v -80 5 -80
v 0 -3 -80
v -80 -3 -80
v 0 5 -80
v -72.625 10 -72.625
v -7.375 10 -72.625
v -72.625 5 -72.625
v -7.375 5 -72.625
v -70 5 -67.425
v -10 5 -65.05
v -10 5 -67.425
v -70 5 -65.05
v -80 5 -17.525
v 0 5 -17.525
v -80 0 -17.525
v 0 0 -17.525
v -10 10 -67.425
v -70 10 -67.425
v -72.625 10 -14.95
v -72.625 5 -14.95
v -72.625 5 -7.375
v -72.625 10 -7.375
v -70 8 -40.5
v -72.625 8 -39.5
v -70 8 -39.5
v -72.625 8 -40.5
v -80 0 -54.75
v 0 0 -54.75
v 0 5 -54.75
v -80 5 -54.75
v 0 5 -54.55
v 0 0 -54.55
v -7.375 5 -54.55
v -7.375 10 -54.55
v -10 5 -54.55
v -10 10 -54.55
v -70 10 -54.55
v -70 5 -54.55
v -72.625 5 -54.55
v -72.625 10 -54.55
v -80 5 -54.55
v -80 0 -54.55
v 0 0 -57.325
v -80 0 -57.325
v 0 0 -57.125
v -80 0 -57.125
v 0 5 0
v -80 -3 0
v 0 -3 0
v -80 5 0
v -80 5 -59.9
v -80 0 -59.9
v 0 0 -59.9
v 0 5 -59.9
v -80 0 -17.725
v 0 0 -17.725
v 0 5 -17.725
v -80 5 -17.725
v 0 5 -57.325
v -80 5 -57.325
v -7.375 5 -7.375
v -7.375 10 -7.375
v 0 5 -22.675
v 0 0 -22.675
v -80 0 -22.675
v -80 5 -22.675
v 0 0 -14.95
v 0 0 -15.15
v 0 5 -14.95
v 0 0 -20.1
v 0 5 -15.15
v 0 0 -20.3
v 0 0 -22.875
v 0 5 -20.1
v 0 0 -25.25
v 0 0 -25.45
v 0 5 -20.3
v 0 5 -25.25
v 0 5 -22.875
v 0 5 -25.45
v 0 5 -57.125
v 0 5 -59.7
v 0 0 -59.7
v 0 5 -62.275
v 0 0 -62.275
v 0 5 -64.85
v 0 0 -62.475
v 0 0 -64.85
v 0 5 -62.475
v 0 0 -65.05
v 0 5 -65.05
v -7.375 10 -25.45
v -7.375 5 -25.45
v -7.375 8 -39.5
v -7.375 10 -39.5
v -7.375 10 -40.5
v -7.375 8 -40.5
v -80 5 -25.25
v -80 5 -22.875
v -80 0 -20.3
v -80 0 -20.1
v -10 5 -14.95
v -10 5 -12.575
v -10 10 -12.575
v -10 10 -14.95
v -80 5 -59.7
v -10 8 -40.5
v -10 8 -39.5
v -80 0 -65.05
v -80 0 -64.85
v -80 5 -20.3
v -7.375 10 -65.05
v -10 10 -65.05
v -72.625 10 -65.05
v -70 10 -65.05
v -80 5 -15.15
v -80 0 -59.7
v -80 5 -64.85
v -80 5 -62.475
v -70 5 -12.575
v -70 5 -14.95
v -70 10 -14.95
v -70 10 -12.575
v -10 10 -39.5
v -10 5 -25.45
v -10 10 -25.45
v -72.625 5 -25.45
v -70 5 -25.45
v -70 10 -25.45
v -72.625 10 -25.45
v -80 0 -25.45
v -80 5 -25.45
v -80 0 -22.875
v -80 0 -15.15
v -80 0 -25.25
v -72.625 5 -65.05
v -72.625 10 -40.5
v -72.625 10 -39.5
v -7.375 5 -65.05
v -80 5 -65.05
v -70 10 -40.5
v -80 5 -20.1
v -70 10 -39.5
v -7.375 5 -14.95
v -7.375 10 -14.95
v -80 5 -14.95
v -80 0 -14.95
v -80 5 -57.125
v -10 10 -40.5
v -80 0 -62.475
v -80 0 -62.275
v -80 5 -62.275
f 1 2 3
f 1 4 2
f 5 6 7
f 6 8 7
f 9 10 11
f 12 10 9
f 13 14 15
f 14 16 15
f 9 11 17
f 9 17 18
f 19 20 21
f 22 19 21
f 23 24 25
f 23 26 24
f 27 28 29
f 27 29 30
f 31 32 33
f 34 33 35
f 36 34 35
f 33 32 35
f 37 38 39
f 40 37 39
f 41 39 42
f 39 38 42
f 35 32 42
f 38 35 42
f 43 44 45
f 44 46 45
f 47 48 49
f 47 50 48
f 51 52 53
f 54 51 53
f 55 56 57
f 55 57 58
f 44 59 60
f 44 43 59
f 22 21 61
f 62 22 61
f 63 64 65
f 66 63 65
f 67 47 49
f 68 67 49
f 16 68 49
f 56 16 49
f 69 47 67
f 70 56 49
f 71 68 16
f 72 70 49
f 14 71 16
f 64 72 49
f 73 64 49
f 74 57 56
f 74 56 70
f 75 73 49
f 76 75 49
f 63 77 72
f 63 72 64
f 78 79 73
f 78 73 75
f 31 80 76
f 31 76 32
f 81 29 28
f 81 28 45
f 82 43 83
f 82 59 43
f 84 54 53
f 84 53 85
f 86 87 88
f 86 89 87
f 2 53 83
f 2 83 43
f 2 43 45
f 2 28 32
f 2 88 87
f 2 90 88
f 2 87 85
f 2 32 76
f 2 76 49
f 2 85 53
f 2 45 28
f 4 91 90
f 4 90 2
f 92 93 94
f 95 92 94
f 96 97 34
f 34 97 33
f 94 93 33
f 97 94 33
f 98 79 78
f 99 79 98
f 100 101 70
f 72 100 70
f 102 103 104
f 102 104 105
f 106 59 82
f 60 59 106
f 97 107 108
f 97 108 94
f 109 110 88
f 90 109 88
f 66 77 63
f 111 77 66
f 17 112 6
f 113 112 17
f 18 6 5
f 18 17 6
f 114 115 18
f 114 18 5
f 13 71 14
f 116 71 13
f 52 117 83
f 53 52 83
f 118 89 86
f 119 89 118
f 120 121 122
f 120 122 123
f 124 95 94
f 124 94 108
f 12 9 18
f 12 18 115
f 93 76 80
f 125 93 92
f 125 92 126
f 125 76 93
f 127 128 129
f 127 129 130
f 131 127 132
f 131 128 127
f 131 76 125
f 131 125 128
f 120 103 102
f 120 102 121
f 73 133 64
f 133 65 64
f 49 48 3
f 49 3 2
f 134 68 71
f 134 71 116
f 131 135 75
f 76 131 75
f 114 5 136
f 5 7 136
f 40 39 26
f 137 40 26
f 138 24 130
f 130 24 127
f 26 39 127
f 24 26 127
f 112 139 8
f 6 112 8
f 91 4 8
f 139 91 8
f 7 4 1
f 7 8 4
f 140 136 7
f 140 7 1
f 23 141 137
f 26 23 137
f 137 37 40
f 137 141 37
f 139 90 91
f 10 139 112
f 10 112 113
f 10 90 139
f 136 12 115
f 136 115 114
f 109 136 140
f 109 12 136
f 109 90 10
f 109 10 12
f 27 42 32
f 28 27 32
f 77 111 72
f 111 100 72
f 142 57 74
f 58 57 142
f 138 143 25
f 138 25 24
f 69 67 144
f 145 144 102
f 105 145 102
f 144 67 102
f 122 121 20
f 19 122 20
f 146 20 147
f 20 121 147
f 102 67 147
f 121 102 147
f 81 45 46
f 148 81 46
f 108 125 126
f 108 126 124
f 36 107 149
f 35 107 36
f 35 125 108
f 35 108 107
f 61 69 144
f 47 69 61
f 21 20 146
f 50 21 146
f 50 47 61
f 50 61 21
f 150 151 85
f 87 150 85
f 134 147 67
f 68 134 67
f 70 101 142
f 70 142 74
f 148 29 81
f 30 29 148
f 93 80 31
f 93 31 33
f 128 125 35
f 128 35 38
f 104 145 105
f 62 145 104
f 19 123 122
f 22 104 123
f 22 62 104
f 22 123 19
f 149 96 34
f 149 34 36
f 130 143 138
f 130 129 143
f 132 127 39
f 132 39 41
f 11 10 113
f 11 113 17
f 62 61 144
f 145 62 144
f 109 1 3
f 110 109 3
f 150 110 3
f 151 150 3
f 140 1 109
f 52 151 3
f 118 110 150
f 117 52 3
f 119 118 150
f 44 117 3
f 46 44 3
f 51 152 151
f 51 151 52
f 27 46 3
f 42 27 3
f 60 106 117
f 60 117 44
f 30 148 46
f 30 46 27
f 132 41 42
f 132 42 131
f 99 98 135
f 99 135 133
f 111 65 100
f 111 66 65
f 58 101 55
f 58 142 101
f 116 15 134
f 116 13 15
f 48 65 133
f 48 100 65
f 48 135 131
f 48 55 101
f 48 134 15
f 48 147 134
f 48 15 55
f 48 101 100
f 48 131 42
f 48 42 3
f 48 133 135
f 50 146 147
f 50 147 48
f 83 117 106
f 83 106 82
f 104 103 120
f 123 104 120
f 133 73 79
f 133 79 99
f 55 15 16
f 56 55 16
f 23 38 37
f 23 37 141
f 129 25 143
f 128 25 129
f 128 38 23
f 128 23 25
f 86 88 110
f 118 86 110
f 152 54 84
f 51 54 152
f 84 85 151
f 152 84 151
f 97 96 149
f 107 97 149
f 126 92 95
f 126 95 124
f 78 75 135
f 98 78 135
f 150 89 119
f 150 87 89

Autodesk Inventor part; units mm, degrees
ref_plane "YZ Plane" through (0, 0, 0) normal (1, 0, 0) x (0, 1, 0)
ref_plane "XZ Plane" through (0, 0, 0) normal (0, 1, 0) x (-1, 0, 0)
ref_plane "XY Plane" through (0, 0, 0) normal (0, 0, 1) x (1, 0, 0)
sketch "Boceto1" plane through (0, 0, 0) normal (0, 1, 0) x (-1, 0, 0)
  line L0 (0, 0) -> (80, 0)
  line L1 (80, 0) -> (80, -80)
  line L2 (80, -80) -> (0, -80)
  line L3 (0, -80) -> (0, 0)
  line L4 (10, -70) -> (70, -70)
  line L5 (70, -70) -> (70, -10)
  line L6 (70, -10) -> (10, -10)
  line L7 (10, -10) -> (10, -70)
  line L8 (0, -12.375) -> (80, -12.375)
  line L9 (0, -14.95) -> (80, -14.95)
  line L10 (0, -17.525) -> (80, -17.525)
  line L11 (80, -20.1) -> (0, -20.1)
  line L12 (0, -22.675) -> (80, -22.675)
  line L13 (0, -12.575) -> (80, -12.575)
  line L14 (0, -15.15) -> (80, -15.15)
  line L15 (0, -17.725) -> (80, -17.725)
  line L16 (80, -20.3) -> (0, -20.3)
  line L17 (0, -22.875) -> (80, -22.875)
  line L18 (0, -25.25) -> (80, -25.25)
  line L19 (0, -25.45) -> (80, -25.45)
  line L20 (10, -40) -> (80, -40)
  line L21 (0, -67.625) -> (80, -67.625)
  line L22 (0, -65.05) -> (80, -65.05)
  line L23 (0, -62.475) -> (80, -62.475)
  line L24 (80, -59.9) -> (0, -59.9)
  line L25 (0, -57.325) -> (80, -57.325)
  line L26 (0, -67.425) -> (80, -67.425)
  line L27 (0, -64.85) -> (80, -64.85)
  line L28 (0, -62.275) -> (80, -62.275)
  line L29 (80, -59.7) -> (0, -59.7)
  line L30 (0, -57.125) -> (80, -57.125)
  line L31 (0, -54.75) -> (80, -54.75)
  line L32 (0, -54.55) -> (80, -54.55)
  line L33 (72.625, -7.375) -> (7.375, -7.375)
  line L34 (7.375, -7.375) -> (7.375, -72.625)
  line L35 (7.375, -72.625) -> (72.625, -72.625)
  line L36 (72.625, -72.625) -> (72.625, -7.375)
  line L37 (7.375, 0) -> (0, 0)
  line L38 (7.375, -80) -> (0, -80)
  point P0 (10, -12.375)
  point P1 (70, -12.375)
  point P2 (10, -14.95)
  point P3 (70, -14.95)
  point P4 (10, -17.525)
  point P5 (70, -17.525)
  point P6 (70, -20.1)
  point P7 (10, -20.1)
  point P8 (10, -22.675)
  point P9 (70, -22.675)
  point P10 (10, -12.575)
  point P11 (70, -12.575)
  point P12 (10, -15.15)
  point P13 (70, -15.15)
  point P14 (10, -17.725)
  point P15 (70, -17.725)
  point P16 (70, -20.3)
  point P17 (10, -20.3)
  point P18 (10, -22.875)
  point P19 (70, -22.875)
  point P20 (10, -25.25)
  point P21 (70, -25.25)
  point P22 (10, -25.45)
  point P23 (70, -25.45)
  point P24 (10, -67.625)
  point P25 (70, -67.625)
  point P26 (10, -65.05)
  point P27 (70, -65.05)
  point P28 (10, -62.475)
  point P29 (70, -62.475)
  point P30 (70, -59.9)
  point P31 (10, -59.9)
  point P32 (10, -57.325)
  point P33 (70, -57.325)
  point P34 (10, -67.425)
  point P35 (70, -67.425)
  point P36 (10, -64.85)
  point P37 (70, -64.85)
  point P38 (10, -62.275)
  point P39 (70, -62.275)
  point P40 (70, -59.7)
  point P41 (10, -59.7)
  point P42 (10, -57.125)
  point P43 (70, -57.125)
  point P44 (10, -54.75)
  point P45 (70, -54.75)
  point P46 (10, -54.55)
  point P47 (70, -54.55)
  point P48 (72.625, -12.375)
  point P49 (7.375, -12.375)
  point P50 (72.625, -54.55)
  point P51 (72.625, -25.45)
  point P52 (70, -25.45)
  point P53 (70, -54.55)
  point P54 (7.375, -25.45)
  point P55 (7.375, -54.55)
  point P56 (10, -54.55)
  point P57 (10, -25.45)
  point P58 (10, -67.625)
  point P59 (7.375, -67.625)
  point P60 (72.625, -67.625)
  point P61 (70, -67.625)
  point P62 (7.375, -14.95)
  point P63 (72.625, -14.95)
  point P64 (72.625, -65.05)
  point P65 (70, -65.05)
  point P66 (10, -65.05)
  point P67 (7.375, -65.05)
  point P68 (70, -67.425)
  point P69 (10, -67.425)
  point P70 (10, -12.575)
  point P71 (70, -12.575)
  dimension "d0" = 80
  dimension "d1" = 80
  dimension "d2" = 60
  dimension "d3" = 60
  dimension "d4" = 10
  dimension "d5" = 10
  dimension "d6" = 2.375
  dimension "d7" = 0.2
  dimension "d8" = 2.375
  dimension "d9" = 0.2
  dimension "d10" = 0.2
  dimension "d11" = 0.2
  dimension "d12" = 0.2
  dimension "d13" = 2.375
  dimension "d14" = 2.375
  dimension "d15" = 2.375
  dimension "d16" = 2.375
  dimension "d17" = 0.2
  dimension "d35" = 5
extrude "Extrusión1" add sketch "Boceto1" along normal blind 5 contours L0 L1 L8 L36 L33 L34 L3 | L8 L34 L13 L3 | L13 L34 L9 L3 | L34 L33 L36 L8 L5 L6 L7 | L8 L7 L13 L34 | L1 L13 L36 L8 | L13 L7 L9 L34 | L8 L5 L13 L7 | L7 L6 L5 L8 | L1 L9 L36 L13 | L36 L13 L5 L8 | L14 L34 L10 L3 | L13 L5 L9 L7 | L36 L9 L5 L13 | L14 L7 L10 L34 | L1 L10 L36 L14 | L15 L34 L11 L3 | L14 L5 L10 L7 | L36 L10 L5 L14 | L15 L7 L11 L34 | L1 L11 L36 L15 | L16 L34 L12 L3 | L15 L5 L11 L7 | L36 L11 L5 L15 | L16 L7 L12 L34 | L1 L12 L36 L16 | L17 L34 L18 L3 | L16 L5 L12 L7 | L36 L12 L5 L16 | L17 L7 L18 L34 | L1 L18 L36 L17 | L19 L34 L32 L3 | L17 L5 L18 L7 | L36 L18 L5 L17 | L19 L7 L32 L34 | L1 L20 L36 L19 | L31 L34 L30 L3 | L19 L5 L20 L7 | L1 L32 L36 L20 | L36 L20 L5 L19 | L31 L7 L30 L34 | L7 L20 L5 L32 | L36 L32 L5 L20 | L25 L34 L29 L3 | L31 L5 L30 L7 | L1 L30 L36 L31 | L25 L7 L29 L34 | L31 L36 L30 L5 | L24 L34 L28 L3 | L25 L5 L29 L7 | L1 L29 L36 L25 | L24 L7 L28 L34 | L25 L36 L29 L5 | L23 L34 L27 L3 | L24 L5 L28 L7 | L1 L28 L36 L24 | L23 L7 L27 L34 | L24 L36 L28 L5 | L22 L34 L26 L3 | L23 L5 L27 L7 | L1 L27 L36 L23 | L26 L34 L21 L3 | L22 L7 L26 L34 | L23 L36 L27 L5 | L21 L34 L35 L36 L1 L2 L3 | L26 L7 L21 L34 | L22 L5 L26 L7 | L1 L26 L36 L22 | L21 L7 L4 L5 L36 L35 L34 | L26 L5 L21 L7 | L22 L36 L26 L5 | L1 L21 L36 L26 | L21 L5 L4 L7 | L26 L36 L21 L5
sketch "Boceto2" plane through (0, 0, 0) normal (0, -1, 0) x (1, 0, 0)
  line L0 (0, -80) -> (-80, -80) projected
  line L1 (-80, 0) -> (0, 0) projected
  line L2 (-80, -80) -> (-80, 0)
  line L3 (-80, 0) -> (0, 0)
  line L4 (-80, -65.05) -> (0, -65.05) construction
  line L5 (0, 0) -> (0, -80)
  line L6 (-80, -80) -> (0, -80)
extrude "Extrusión4" add sketch "Boceto2" along normal blind 3
extrude "Extrusión5" add sketch "Boceto1" along normal blind 10 contours L34 L33 L36 L8 L5 L6 L7 | L8 L7 L13 L34 | L13 L7 L9 L34 | L8 L5 L13 L7 | L7 L6 L5 L8 | L36 L13 L5 L8 | L36 L9 L5 L13 | L19 L7 L32 L34 | L36 L20 L5 L19 | L36 L32 L5 L20 | L22 L7 L26 L34 | L26 L7 L21 L34 | L21 L7 L4 L5 L36 L35 L34 | L26 L5 L21 L7 | L22 L36 L26 L5 | L21 L5 L4 L7 | L26 L36 L21 L5
sketch "Boceto3" plane through (0, 10, 0) normal (0, 1, 0) x (1, 0, 0)
  line L0 (-7.375, 25.45) -> (-7.375, 54.55) projected
  line L1 (-7.375, 40) -> (-86.5517, 40)
  line L2 (-5, 39.5) -> (-84.1767, 39.5)
  line L3 (-5, 40.5) -> (-84.1767, 40.5)
  line L4 (-10, 54.55) -> (-10, 25.45) projected
  line L5 (-5, 40.5) -> (-5, 39.5)
  line L6 (-84.1767, 40.5) -> (-84.1767, 39.5)
  point P0 (0, 0)
  point P1 (-10, 40)
  point P2 (-10, 39.5)
  point P3 (-10, 40.5)
  point P4 (-7.375, 39.5)
  point P5 (-7.375, 40.5)
  dimension "d31" = 0.5
  dimension "d32" = 0.5
extrude "Extrusión6" cut sketch "Boceto3" against normal blind 2 contours L2 L4 L1 L0 | L1 L4 L3 L0 | L2 L6 L1 L4 | L1 L6 L3 L4
equation "\"d8\" = d6"
equation "\"d9\" = d7"
equation "\"d10\" = d9"
equation "\"d11\" = d7"
equation "\"d12\" = d7"
equation "\"d13\" = d6"
equation "\"d14\" = d6"
equation "\"d15\" = d6"
equation "\"d16\" = d6"
equation "\"d17\" = d7"
properties part number "Cortador Ancho PDMS5.5"
